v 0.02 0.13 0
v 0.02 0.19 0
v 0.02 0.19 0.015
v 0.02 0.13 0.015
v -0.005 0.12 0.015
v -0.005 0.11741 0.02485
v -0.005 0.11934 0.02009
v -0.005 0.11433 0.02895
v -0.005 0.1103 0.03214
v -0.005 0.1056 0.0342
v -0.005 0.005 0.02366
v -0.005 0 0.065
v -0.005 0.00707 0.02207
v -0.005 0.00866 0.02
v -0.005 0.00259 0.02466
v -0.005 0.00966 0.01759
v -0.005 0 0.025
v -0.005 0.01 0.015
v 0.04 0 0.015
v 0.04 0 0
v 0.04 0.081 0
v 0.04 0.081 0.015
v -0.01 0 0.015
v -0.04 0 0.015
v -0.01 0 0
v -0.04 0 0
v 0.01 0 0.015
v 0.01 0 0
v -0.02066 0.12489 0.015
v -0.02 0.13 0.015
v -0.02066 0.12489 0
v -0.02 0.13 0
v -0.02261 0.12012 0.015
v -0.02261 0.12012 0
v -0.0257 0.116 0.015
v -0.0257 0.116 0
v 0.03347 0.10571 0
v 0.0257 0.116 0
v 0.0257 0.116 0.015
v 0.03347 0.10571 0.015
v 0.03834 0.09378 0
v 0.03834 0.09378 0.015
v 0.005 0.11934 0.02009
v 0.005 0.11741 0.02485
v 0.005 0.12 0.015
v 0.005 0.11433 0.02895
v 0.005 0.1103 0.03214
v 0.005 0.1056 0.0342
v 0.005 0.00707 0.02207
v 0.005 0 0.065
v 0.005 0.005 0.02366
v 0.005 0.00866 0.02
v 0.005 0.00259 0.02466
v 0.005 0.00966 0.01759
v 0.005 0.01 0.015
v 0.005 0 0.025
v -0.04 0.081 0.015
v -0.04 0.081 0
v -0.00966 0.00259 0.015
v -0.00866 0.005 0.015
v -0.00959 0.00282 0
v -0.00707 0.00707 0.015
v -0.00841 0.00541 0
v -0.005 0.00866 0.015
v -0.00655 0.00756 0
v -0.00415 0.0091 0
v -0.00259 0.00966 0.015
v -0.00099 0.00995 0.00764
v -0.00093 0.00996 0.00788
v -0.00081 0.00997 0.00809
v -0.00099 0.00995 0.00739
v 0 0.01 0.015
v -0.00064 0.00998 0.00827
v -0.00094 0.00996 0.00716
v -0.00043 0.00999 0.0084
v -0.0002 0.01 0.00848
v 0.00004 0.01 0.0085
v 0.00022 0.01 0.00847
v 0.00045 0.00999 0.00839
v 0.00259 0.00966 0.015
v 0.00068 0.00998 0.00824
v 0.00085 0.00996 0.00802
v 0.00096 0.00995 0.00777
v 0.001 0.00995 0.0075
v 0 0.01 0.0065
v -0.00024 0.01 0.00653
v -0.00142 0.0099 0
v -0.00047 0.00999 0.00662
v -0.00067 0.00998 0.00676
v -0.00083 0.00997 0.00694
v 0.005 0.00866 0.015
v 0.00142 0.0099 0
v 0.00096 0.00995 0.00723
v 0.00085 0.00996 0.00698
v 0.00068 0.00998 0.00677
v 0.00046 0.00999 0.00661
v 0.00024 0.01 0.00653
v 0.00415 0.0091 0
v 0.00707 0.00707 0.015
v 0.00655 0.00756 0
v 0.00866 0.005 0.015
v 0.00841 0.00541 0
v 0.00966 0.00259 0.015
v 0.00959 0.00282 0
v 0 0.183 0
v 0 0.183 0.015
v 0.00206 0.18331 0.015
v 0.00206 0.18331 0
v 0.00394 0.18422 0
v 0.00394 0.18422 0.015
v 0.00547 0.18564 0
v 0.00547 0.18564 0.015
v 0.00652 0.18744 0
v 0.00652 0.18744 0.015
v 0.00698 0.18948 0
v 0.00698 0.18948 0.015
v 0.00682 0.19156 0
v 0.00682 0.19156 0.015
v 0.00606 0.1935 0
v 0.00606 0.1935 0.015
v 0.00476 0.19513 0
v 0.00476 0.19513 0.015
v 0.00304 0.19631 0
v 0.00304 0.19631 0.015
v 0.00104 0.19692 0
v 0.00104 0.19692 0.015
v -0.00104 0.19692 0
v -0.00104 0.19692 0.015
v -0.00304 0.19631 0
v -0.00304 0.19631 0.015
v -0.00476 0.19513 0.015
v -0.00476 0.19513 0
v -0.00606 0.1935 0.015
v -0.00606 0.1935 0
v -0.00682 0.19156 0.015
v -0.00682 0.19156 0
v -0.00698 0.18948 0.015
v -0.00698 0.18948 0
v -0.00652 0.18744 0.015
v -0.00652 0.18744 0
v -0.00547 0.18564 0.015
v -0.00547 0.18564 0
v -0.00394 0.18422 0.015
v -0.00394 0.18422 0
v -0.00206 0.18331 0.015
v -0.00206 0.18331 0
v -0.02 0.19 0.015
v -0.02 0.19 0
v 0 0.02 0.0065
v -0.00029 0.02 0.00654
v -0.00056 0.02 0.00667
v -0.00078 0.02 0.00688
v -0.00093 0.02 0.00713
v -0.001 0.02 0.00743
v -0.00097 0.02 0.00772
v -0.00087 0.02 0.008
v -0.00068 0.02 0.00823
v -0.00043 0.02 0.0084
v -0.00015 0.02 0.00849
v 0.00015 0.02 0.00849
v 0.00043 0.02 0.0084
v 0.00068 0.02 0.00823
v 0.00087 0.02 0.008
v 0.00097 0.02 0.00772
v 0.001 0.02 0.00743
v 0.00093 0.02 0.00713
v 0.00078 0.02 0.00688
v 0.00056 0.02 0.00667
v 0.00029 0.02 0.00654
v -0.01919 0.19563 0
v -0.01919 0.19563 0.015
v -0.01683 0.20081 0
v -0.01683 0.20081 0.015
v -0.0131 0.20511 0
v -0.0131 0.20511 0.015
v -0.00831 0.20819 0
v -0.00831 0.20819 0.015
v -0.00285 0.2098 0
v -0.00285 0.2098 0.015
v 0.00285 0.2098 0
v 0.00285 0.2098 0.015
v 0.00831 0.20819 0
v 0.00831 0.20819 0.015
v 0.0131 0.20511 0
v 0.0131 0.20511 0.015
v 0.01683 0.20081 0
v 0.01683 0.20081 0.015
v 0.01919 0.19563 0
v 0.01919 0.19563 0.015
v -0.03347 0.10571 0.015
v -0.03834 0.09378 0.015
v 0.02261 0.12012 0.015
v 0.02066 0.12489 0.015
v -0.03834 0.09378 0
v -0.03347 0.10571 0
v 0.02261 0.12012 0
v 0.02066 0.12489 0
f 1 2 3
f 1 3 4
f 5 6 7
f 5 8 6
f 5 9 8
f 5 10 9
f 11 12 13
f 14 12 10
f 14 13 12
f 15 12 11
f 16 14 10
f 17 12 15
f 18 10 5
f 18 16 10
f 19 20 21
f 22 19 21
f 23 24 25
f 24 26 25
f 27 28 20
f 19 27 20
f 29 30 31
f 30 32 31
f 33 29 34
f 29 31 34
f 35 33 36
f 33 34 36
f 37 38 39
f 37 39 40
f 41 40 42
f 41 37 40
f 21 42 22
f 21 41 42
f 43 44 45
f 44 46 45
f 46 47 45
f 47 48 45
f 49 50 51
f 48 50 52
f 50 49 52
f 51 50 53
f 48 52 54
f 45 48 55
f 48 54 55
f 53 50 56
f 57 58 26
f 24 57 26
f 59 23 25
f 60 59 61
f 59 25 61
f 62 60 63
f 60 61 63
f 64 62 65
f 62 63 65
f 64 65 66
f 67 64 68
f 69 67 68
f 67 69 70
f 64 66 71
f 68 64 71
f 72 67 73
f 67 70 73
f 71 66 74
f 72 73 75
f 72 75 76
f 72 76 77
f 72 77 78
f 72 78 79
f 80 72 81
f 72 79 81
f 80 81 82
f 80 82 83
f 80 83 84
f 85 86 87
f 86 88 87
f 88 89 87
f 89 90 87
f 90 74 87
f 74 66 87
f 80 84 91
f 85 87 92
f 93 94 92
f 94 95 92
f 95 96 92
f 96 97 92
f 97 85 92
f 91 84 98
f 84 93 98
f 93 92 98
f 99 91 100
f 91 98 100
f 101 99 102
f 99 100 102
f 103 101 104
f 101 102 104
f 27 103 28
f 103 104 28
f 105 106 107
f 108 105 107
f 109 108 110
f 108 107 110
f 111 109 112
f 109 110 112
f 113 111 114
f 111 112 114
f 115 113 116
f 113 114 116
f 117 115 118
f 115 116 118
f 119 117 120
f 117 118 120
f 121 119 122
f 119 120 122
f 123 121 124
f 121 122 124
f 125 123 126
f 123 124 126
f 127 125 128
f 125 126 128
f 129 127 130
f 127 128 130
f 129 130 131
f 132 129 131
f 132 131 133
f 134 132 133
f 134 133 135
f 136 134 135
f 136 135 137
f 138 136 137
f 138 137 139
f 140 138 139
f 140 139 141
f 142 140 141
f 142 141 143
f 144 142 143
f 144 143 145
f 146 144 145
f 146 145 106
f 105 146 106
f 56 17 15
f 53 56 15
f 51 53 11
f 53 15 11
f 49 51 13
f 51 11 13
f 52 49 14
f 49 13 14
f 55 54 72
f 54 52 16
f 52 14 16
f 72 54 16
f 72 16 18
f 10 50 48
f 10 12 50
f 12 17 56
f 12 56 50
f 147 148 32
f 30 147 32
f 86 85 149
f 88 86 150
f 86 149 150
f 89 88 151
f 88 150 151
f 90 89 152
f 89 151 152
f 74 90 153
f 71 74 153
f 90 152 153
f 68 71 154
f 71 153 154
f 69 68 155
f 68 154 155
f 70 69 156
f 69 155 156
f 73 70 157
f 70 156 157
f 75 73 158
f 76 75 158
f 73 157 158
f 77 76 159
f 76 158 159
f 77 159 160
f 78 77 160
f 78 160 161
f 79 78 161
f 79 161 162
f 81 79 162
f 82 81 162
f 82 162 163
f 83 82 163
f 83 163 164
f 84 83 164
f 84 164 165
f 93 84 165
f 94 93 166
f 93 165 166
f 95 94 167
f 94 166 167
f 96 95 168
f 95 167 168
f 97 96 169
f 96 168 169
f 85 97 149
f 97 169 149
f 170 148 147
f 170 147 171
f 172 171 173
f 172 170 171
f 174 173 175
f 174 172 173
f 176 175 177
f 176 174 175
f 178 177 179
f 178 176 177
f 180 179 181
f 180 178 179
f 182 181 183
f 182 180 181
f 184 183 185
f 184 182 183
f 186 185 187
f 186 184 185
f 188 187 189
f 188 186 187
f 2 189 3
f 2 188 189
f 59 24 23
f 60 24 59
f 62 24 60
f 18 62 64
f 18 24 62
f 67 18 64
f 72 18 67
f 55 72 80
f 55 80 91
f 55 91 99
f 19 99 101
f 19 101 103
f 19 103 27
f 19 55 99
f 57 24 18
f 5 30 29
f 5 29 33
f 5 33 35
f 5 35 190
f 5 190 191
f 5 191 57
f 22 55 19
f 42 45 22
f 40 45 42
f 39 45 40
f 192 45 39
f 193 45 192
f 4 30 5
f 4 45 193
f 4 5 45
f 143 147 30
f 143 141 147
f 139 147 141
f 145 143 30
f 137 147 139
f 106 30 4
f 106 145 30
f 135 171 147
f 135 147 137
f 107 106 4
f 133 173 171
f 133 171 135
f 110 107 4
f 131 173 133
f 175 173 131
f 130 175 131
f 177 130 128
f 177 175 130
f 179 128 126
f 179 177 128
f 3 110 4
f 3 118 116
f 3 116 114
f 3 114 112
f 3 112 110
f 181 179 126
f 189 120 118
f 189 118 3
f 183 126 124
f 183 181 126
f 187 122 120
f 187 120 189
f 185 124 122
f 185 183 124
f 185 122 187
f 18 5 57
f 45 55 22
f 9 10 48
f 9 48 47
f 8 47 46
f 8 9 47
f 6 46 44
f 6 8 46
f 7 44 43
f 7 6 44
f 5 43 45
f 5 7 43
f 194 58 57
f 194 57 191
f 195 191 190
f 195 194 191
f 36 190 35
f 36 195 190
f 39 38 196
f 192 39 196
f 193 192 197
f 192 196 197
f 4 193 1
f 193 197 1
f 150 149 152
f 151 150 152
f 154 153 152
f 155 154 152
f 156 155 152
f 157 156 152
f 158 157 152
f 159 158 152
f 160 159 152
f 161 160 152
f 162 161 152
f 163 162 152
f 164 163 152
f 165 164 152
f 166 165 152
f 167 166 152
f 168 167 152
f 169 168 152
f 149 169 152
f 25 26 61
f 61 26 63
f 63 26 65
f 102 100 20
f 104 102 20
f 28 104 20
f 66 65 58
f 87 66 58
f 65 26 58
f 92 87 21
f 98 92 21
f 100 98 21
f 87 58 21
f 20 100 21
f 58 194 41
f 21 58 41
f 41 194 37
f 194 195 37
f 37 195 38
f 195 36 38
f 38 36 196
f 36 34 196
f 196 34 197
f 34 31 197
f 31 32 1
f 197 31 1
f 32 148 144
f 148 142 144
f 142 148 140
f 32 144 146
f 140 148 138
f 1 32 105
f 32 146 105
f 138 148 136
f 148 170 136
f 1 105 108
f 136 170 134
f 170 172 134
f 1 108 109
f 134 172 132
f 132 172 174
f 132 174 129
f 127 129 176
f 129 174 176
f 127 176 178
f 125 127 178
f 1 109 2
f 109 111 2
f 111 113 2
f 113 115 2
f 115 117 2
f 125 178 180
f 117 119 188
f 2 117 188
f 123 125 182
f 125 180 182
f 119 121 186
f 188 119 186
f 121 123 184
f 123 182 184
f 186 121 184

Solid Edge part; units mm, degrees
sketch "Sketch1" plane through (0, 0, 0) normal (0, 0, 1) x (1, 0, 0)
  line L0 (-0.04, 0) -> (0.04, 0)
  line L1 (0.04, 0) -> (0.04, 0.081)
  arc A0 (0.04, 0.081) -> (0.0257, 0.116) centre (-0.01, 0.081) ccw
  line L2 (0.02, 0.19) -> (0.02, 0.13)
  line L3 (-0.02, 0.19) -> (-0.02, 0.13)
  arc A1 (-0.0257, 0.116) -> (-0.04, 0.081) centre (0.01, 0.081) ccw
  line L4 (-0.04, 0.081) -> (-0.04, 0)
  arc A2 (0.0257, 0.116) -> (0.02, 0.13) centre (0.04, 0.13) cw
  arc A3 (0.02, 0.19) -> (-0.02, 0.19) centre (0, 0.19) ccw
  arc A4 (-0.02, 0.13) -> (-0.0257, 0.116) centre (-0.04, 0.13) cw
  dimension "D1" = 0.04
  dimension "D2" = 0.02
extrude "Protrusion1" add sketch "Sketch1" along normal blind 0.015
hole "Bohrung_1" at (0, 0, 0.0075) direction (0, 1, 0) diameter 0.002 depth 0.02
hole "Bohrung_2" at (0, 0.19, 0.015) direction (0, 0, -1) diameter 0.014 end through all
hole "Bohrung_3" at (0, 0, 0.015) direction (0, 0, -1) diameter 0.02 depth 3.175
sketch "Sketch2" plane through (0, 0, 0) normal (1, 0, 0) x (0, 1, 0)
  line L0 (0, 0.025) -> (0, 0.065)
  line L1 (0, 0.065) -> (0.1056, 0.0342)
  line L2 (0.01, 0.015) -> (0.12, 0.015)
  arc A0 (0.12, 0.015) -> (0.1056, 0.0342) centre (0.1, 0.015) ccw
  arc A1 (0, 0.025) -> (0.01, 0.015) centre (0, 0.015) cw
extrude "Ausprägung_2" add sketch "Sketch2" along normal mid plane 0.01
